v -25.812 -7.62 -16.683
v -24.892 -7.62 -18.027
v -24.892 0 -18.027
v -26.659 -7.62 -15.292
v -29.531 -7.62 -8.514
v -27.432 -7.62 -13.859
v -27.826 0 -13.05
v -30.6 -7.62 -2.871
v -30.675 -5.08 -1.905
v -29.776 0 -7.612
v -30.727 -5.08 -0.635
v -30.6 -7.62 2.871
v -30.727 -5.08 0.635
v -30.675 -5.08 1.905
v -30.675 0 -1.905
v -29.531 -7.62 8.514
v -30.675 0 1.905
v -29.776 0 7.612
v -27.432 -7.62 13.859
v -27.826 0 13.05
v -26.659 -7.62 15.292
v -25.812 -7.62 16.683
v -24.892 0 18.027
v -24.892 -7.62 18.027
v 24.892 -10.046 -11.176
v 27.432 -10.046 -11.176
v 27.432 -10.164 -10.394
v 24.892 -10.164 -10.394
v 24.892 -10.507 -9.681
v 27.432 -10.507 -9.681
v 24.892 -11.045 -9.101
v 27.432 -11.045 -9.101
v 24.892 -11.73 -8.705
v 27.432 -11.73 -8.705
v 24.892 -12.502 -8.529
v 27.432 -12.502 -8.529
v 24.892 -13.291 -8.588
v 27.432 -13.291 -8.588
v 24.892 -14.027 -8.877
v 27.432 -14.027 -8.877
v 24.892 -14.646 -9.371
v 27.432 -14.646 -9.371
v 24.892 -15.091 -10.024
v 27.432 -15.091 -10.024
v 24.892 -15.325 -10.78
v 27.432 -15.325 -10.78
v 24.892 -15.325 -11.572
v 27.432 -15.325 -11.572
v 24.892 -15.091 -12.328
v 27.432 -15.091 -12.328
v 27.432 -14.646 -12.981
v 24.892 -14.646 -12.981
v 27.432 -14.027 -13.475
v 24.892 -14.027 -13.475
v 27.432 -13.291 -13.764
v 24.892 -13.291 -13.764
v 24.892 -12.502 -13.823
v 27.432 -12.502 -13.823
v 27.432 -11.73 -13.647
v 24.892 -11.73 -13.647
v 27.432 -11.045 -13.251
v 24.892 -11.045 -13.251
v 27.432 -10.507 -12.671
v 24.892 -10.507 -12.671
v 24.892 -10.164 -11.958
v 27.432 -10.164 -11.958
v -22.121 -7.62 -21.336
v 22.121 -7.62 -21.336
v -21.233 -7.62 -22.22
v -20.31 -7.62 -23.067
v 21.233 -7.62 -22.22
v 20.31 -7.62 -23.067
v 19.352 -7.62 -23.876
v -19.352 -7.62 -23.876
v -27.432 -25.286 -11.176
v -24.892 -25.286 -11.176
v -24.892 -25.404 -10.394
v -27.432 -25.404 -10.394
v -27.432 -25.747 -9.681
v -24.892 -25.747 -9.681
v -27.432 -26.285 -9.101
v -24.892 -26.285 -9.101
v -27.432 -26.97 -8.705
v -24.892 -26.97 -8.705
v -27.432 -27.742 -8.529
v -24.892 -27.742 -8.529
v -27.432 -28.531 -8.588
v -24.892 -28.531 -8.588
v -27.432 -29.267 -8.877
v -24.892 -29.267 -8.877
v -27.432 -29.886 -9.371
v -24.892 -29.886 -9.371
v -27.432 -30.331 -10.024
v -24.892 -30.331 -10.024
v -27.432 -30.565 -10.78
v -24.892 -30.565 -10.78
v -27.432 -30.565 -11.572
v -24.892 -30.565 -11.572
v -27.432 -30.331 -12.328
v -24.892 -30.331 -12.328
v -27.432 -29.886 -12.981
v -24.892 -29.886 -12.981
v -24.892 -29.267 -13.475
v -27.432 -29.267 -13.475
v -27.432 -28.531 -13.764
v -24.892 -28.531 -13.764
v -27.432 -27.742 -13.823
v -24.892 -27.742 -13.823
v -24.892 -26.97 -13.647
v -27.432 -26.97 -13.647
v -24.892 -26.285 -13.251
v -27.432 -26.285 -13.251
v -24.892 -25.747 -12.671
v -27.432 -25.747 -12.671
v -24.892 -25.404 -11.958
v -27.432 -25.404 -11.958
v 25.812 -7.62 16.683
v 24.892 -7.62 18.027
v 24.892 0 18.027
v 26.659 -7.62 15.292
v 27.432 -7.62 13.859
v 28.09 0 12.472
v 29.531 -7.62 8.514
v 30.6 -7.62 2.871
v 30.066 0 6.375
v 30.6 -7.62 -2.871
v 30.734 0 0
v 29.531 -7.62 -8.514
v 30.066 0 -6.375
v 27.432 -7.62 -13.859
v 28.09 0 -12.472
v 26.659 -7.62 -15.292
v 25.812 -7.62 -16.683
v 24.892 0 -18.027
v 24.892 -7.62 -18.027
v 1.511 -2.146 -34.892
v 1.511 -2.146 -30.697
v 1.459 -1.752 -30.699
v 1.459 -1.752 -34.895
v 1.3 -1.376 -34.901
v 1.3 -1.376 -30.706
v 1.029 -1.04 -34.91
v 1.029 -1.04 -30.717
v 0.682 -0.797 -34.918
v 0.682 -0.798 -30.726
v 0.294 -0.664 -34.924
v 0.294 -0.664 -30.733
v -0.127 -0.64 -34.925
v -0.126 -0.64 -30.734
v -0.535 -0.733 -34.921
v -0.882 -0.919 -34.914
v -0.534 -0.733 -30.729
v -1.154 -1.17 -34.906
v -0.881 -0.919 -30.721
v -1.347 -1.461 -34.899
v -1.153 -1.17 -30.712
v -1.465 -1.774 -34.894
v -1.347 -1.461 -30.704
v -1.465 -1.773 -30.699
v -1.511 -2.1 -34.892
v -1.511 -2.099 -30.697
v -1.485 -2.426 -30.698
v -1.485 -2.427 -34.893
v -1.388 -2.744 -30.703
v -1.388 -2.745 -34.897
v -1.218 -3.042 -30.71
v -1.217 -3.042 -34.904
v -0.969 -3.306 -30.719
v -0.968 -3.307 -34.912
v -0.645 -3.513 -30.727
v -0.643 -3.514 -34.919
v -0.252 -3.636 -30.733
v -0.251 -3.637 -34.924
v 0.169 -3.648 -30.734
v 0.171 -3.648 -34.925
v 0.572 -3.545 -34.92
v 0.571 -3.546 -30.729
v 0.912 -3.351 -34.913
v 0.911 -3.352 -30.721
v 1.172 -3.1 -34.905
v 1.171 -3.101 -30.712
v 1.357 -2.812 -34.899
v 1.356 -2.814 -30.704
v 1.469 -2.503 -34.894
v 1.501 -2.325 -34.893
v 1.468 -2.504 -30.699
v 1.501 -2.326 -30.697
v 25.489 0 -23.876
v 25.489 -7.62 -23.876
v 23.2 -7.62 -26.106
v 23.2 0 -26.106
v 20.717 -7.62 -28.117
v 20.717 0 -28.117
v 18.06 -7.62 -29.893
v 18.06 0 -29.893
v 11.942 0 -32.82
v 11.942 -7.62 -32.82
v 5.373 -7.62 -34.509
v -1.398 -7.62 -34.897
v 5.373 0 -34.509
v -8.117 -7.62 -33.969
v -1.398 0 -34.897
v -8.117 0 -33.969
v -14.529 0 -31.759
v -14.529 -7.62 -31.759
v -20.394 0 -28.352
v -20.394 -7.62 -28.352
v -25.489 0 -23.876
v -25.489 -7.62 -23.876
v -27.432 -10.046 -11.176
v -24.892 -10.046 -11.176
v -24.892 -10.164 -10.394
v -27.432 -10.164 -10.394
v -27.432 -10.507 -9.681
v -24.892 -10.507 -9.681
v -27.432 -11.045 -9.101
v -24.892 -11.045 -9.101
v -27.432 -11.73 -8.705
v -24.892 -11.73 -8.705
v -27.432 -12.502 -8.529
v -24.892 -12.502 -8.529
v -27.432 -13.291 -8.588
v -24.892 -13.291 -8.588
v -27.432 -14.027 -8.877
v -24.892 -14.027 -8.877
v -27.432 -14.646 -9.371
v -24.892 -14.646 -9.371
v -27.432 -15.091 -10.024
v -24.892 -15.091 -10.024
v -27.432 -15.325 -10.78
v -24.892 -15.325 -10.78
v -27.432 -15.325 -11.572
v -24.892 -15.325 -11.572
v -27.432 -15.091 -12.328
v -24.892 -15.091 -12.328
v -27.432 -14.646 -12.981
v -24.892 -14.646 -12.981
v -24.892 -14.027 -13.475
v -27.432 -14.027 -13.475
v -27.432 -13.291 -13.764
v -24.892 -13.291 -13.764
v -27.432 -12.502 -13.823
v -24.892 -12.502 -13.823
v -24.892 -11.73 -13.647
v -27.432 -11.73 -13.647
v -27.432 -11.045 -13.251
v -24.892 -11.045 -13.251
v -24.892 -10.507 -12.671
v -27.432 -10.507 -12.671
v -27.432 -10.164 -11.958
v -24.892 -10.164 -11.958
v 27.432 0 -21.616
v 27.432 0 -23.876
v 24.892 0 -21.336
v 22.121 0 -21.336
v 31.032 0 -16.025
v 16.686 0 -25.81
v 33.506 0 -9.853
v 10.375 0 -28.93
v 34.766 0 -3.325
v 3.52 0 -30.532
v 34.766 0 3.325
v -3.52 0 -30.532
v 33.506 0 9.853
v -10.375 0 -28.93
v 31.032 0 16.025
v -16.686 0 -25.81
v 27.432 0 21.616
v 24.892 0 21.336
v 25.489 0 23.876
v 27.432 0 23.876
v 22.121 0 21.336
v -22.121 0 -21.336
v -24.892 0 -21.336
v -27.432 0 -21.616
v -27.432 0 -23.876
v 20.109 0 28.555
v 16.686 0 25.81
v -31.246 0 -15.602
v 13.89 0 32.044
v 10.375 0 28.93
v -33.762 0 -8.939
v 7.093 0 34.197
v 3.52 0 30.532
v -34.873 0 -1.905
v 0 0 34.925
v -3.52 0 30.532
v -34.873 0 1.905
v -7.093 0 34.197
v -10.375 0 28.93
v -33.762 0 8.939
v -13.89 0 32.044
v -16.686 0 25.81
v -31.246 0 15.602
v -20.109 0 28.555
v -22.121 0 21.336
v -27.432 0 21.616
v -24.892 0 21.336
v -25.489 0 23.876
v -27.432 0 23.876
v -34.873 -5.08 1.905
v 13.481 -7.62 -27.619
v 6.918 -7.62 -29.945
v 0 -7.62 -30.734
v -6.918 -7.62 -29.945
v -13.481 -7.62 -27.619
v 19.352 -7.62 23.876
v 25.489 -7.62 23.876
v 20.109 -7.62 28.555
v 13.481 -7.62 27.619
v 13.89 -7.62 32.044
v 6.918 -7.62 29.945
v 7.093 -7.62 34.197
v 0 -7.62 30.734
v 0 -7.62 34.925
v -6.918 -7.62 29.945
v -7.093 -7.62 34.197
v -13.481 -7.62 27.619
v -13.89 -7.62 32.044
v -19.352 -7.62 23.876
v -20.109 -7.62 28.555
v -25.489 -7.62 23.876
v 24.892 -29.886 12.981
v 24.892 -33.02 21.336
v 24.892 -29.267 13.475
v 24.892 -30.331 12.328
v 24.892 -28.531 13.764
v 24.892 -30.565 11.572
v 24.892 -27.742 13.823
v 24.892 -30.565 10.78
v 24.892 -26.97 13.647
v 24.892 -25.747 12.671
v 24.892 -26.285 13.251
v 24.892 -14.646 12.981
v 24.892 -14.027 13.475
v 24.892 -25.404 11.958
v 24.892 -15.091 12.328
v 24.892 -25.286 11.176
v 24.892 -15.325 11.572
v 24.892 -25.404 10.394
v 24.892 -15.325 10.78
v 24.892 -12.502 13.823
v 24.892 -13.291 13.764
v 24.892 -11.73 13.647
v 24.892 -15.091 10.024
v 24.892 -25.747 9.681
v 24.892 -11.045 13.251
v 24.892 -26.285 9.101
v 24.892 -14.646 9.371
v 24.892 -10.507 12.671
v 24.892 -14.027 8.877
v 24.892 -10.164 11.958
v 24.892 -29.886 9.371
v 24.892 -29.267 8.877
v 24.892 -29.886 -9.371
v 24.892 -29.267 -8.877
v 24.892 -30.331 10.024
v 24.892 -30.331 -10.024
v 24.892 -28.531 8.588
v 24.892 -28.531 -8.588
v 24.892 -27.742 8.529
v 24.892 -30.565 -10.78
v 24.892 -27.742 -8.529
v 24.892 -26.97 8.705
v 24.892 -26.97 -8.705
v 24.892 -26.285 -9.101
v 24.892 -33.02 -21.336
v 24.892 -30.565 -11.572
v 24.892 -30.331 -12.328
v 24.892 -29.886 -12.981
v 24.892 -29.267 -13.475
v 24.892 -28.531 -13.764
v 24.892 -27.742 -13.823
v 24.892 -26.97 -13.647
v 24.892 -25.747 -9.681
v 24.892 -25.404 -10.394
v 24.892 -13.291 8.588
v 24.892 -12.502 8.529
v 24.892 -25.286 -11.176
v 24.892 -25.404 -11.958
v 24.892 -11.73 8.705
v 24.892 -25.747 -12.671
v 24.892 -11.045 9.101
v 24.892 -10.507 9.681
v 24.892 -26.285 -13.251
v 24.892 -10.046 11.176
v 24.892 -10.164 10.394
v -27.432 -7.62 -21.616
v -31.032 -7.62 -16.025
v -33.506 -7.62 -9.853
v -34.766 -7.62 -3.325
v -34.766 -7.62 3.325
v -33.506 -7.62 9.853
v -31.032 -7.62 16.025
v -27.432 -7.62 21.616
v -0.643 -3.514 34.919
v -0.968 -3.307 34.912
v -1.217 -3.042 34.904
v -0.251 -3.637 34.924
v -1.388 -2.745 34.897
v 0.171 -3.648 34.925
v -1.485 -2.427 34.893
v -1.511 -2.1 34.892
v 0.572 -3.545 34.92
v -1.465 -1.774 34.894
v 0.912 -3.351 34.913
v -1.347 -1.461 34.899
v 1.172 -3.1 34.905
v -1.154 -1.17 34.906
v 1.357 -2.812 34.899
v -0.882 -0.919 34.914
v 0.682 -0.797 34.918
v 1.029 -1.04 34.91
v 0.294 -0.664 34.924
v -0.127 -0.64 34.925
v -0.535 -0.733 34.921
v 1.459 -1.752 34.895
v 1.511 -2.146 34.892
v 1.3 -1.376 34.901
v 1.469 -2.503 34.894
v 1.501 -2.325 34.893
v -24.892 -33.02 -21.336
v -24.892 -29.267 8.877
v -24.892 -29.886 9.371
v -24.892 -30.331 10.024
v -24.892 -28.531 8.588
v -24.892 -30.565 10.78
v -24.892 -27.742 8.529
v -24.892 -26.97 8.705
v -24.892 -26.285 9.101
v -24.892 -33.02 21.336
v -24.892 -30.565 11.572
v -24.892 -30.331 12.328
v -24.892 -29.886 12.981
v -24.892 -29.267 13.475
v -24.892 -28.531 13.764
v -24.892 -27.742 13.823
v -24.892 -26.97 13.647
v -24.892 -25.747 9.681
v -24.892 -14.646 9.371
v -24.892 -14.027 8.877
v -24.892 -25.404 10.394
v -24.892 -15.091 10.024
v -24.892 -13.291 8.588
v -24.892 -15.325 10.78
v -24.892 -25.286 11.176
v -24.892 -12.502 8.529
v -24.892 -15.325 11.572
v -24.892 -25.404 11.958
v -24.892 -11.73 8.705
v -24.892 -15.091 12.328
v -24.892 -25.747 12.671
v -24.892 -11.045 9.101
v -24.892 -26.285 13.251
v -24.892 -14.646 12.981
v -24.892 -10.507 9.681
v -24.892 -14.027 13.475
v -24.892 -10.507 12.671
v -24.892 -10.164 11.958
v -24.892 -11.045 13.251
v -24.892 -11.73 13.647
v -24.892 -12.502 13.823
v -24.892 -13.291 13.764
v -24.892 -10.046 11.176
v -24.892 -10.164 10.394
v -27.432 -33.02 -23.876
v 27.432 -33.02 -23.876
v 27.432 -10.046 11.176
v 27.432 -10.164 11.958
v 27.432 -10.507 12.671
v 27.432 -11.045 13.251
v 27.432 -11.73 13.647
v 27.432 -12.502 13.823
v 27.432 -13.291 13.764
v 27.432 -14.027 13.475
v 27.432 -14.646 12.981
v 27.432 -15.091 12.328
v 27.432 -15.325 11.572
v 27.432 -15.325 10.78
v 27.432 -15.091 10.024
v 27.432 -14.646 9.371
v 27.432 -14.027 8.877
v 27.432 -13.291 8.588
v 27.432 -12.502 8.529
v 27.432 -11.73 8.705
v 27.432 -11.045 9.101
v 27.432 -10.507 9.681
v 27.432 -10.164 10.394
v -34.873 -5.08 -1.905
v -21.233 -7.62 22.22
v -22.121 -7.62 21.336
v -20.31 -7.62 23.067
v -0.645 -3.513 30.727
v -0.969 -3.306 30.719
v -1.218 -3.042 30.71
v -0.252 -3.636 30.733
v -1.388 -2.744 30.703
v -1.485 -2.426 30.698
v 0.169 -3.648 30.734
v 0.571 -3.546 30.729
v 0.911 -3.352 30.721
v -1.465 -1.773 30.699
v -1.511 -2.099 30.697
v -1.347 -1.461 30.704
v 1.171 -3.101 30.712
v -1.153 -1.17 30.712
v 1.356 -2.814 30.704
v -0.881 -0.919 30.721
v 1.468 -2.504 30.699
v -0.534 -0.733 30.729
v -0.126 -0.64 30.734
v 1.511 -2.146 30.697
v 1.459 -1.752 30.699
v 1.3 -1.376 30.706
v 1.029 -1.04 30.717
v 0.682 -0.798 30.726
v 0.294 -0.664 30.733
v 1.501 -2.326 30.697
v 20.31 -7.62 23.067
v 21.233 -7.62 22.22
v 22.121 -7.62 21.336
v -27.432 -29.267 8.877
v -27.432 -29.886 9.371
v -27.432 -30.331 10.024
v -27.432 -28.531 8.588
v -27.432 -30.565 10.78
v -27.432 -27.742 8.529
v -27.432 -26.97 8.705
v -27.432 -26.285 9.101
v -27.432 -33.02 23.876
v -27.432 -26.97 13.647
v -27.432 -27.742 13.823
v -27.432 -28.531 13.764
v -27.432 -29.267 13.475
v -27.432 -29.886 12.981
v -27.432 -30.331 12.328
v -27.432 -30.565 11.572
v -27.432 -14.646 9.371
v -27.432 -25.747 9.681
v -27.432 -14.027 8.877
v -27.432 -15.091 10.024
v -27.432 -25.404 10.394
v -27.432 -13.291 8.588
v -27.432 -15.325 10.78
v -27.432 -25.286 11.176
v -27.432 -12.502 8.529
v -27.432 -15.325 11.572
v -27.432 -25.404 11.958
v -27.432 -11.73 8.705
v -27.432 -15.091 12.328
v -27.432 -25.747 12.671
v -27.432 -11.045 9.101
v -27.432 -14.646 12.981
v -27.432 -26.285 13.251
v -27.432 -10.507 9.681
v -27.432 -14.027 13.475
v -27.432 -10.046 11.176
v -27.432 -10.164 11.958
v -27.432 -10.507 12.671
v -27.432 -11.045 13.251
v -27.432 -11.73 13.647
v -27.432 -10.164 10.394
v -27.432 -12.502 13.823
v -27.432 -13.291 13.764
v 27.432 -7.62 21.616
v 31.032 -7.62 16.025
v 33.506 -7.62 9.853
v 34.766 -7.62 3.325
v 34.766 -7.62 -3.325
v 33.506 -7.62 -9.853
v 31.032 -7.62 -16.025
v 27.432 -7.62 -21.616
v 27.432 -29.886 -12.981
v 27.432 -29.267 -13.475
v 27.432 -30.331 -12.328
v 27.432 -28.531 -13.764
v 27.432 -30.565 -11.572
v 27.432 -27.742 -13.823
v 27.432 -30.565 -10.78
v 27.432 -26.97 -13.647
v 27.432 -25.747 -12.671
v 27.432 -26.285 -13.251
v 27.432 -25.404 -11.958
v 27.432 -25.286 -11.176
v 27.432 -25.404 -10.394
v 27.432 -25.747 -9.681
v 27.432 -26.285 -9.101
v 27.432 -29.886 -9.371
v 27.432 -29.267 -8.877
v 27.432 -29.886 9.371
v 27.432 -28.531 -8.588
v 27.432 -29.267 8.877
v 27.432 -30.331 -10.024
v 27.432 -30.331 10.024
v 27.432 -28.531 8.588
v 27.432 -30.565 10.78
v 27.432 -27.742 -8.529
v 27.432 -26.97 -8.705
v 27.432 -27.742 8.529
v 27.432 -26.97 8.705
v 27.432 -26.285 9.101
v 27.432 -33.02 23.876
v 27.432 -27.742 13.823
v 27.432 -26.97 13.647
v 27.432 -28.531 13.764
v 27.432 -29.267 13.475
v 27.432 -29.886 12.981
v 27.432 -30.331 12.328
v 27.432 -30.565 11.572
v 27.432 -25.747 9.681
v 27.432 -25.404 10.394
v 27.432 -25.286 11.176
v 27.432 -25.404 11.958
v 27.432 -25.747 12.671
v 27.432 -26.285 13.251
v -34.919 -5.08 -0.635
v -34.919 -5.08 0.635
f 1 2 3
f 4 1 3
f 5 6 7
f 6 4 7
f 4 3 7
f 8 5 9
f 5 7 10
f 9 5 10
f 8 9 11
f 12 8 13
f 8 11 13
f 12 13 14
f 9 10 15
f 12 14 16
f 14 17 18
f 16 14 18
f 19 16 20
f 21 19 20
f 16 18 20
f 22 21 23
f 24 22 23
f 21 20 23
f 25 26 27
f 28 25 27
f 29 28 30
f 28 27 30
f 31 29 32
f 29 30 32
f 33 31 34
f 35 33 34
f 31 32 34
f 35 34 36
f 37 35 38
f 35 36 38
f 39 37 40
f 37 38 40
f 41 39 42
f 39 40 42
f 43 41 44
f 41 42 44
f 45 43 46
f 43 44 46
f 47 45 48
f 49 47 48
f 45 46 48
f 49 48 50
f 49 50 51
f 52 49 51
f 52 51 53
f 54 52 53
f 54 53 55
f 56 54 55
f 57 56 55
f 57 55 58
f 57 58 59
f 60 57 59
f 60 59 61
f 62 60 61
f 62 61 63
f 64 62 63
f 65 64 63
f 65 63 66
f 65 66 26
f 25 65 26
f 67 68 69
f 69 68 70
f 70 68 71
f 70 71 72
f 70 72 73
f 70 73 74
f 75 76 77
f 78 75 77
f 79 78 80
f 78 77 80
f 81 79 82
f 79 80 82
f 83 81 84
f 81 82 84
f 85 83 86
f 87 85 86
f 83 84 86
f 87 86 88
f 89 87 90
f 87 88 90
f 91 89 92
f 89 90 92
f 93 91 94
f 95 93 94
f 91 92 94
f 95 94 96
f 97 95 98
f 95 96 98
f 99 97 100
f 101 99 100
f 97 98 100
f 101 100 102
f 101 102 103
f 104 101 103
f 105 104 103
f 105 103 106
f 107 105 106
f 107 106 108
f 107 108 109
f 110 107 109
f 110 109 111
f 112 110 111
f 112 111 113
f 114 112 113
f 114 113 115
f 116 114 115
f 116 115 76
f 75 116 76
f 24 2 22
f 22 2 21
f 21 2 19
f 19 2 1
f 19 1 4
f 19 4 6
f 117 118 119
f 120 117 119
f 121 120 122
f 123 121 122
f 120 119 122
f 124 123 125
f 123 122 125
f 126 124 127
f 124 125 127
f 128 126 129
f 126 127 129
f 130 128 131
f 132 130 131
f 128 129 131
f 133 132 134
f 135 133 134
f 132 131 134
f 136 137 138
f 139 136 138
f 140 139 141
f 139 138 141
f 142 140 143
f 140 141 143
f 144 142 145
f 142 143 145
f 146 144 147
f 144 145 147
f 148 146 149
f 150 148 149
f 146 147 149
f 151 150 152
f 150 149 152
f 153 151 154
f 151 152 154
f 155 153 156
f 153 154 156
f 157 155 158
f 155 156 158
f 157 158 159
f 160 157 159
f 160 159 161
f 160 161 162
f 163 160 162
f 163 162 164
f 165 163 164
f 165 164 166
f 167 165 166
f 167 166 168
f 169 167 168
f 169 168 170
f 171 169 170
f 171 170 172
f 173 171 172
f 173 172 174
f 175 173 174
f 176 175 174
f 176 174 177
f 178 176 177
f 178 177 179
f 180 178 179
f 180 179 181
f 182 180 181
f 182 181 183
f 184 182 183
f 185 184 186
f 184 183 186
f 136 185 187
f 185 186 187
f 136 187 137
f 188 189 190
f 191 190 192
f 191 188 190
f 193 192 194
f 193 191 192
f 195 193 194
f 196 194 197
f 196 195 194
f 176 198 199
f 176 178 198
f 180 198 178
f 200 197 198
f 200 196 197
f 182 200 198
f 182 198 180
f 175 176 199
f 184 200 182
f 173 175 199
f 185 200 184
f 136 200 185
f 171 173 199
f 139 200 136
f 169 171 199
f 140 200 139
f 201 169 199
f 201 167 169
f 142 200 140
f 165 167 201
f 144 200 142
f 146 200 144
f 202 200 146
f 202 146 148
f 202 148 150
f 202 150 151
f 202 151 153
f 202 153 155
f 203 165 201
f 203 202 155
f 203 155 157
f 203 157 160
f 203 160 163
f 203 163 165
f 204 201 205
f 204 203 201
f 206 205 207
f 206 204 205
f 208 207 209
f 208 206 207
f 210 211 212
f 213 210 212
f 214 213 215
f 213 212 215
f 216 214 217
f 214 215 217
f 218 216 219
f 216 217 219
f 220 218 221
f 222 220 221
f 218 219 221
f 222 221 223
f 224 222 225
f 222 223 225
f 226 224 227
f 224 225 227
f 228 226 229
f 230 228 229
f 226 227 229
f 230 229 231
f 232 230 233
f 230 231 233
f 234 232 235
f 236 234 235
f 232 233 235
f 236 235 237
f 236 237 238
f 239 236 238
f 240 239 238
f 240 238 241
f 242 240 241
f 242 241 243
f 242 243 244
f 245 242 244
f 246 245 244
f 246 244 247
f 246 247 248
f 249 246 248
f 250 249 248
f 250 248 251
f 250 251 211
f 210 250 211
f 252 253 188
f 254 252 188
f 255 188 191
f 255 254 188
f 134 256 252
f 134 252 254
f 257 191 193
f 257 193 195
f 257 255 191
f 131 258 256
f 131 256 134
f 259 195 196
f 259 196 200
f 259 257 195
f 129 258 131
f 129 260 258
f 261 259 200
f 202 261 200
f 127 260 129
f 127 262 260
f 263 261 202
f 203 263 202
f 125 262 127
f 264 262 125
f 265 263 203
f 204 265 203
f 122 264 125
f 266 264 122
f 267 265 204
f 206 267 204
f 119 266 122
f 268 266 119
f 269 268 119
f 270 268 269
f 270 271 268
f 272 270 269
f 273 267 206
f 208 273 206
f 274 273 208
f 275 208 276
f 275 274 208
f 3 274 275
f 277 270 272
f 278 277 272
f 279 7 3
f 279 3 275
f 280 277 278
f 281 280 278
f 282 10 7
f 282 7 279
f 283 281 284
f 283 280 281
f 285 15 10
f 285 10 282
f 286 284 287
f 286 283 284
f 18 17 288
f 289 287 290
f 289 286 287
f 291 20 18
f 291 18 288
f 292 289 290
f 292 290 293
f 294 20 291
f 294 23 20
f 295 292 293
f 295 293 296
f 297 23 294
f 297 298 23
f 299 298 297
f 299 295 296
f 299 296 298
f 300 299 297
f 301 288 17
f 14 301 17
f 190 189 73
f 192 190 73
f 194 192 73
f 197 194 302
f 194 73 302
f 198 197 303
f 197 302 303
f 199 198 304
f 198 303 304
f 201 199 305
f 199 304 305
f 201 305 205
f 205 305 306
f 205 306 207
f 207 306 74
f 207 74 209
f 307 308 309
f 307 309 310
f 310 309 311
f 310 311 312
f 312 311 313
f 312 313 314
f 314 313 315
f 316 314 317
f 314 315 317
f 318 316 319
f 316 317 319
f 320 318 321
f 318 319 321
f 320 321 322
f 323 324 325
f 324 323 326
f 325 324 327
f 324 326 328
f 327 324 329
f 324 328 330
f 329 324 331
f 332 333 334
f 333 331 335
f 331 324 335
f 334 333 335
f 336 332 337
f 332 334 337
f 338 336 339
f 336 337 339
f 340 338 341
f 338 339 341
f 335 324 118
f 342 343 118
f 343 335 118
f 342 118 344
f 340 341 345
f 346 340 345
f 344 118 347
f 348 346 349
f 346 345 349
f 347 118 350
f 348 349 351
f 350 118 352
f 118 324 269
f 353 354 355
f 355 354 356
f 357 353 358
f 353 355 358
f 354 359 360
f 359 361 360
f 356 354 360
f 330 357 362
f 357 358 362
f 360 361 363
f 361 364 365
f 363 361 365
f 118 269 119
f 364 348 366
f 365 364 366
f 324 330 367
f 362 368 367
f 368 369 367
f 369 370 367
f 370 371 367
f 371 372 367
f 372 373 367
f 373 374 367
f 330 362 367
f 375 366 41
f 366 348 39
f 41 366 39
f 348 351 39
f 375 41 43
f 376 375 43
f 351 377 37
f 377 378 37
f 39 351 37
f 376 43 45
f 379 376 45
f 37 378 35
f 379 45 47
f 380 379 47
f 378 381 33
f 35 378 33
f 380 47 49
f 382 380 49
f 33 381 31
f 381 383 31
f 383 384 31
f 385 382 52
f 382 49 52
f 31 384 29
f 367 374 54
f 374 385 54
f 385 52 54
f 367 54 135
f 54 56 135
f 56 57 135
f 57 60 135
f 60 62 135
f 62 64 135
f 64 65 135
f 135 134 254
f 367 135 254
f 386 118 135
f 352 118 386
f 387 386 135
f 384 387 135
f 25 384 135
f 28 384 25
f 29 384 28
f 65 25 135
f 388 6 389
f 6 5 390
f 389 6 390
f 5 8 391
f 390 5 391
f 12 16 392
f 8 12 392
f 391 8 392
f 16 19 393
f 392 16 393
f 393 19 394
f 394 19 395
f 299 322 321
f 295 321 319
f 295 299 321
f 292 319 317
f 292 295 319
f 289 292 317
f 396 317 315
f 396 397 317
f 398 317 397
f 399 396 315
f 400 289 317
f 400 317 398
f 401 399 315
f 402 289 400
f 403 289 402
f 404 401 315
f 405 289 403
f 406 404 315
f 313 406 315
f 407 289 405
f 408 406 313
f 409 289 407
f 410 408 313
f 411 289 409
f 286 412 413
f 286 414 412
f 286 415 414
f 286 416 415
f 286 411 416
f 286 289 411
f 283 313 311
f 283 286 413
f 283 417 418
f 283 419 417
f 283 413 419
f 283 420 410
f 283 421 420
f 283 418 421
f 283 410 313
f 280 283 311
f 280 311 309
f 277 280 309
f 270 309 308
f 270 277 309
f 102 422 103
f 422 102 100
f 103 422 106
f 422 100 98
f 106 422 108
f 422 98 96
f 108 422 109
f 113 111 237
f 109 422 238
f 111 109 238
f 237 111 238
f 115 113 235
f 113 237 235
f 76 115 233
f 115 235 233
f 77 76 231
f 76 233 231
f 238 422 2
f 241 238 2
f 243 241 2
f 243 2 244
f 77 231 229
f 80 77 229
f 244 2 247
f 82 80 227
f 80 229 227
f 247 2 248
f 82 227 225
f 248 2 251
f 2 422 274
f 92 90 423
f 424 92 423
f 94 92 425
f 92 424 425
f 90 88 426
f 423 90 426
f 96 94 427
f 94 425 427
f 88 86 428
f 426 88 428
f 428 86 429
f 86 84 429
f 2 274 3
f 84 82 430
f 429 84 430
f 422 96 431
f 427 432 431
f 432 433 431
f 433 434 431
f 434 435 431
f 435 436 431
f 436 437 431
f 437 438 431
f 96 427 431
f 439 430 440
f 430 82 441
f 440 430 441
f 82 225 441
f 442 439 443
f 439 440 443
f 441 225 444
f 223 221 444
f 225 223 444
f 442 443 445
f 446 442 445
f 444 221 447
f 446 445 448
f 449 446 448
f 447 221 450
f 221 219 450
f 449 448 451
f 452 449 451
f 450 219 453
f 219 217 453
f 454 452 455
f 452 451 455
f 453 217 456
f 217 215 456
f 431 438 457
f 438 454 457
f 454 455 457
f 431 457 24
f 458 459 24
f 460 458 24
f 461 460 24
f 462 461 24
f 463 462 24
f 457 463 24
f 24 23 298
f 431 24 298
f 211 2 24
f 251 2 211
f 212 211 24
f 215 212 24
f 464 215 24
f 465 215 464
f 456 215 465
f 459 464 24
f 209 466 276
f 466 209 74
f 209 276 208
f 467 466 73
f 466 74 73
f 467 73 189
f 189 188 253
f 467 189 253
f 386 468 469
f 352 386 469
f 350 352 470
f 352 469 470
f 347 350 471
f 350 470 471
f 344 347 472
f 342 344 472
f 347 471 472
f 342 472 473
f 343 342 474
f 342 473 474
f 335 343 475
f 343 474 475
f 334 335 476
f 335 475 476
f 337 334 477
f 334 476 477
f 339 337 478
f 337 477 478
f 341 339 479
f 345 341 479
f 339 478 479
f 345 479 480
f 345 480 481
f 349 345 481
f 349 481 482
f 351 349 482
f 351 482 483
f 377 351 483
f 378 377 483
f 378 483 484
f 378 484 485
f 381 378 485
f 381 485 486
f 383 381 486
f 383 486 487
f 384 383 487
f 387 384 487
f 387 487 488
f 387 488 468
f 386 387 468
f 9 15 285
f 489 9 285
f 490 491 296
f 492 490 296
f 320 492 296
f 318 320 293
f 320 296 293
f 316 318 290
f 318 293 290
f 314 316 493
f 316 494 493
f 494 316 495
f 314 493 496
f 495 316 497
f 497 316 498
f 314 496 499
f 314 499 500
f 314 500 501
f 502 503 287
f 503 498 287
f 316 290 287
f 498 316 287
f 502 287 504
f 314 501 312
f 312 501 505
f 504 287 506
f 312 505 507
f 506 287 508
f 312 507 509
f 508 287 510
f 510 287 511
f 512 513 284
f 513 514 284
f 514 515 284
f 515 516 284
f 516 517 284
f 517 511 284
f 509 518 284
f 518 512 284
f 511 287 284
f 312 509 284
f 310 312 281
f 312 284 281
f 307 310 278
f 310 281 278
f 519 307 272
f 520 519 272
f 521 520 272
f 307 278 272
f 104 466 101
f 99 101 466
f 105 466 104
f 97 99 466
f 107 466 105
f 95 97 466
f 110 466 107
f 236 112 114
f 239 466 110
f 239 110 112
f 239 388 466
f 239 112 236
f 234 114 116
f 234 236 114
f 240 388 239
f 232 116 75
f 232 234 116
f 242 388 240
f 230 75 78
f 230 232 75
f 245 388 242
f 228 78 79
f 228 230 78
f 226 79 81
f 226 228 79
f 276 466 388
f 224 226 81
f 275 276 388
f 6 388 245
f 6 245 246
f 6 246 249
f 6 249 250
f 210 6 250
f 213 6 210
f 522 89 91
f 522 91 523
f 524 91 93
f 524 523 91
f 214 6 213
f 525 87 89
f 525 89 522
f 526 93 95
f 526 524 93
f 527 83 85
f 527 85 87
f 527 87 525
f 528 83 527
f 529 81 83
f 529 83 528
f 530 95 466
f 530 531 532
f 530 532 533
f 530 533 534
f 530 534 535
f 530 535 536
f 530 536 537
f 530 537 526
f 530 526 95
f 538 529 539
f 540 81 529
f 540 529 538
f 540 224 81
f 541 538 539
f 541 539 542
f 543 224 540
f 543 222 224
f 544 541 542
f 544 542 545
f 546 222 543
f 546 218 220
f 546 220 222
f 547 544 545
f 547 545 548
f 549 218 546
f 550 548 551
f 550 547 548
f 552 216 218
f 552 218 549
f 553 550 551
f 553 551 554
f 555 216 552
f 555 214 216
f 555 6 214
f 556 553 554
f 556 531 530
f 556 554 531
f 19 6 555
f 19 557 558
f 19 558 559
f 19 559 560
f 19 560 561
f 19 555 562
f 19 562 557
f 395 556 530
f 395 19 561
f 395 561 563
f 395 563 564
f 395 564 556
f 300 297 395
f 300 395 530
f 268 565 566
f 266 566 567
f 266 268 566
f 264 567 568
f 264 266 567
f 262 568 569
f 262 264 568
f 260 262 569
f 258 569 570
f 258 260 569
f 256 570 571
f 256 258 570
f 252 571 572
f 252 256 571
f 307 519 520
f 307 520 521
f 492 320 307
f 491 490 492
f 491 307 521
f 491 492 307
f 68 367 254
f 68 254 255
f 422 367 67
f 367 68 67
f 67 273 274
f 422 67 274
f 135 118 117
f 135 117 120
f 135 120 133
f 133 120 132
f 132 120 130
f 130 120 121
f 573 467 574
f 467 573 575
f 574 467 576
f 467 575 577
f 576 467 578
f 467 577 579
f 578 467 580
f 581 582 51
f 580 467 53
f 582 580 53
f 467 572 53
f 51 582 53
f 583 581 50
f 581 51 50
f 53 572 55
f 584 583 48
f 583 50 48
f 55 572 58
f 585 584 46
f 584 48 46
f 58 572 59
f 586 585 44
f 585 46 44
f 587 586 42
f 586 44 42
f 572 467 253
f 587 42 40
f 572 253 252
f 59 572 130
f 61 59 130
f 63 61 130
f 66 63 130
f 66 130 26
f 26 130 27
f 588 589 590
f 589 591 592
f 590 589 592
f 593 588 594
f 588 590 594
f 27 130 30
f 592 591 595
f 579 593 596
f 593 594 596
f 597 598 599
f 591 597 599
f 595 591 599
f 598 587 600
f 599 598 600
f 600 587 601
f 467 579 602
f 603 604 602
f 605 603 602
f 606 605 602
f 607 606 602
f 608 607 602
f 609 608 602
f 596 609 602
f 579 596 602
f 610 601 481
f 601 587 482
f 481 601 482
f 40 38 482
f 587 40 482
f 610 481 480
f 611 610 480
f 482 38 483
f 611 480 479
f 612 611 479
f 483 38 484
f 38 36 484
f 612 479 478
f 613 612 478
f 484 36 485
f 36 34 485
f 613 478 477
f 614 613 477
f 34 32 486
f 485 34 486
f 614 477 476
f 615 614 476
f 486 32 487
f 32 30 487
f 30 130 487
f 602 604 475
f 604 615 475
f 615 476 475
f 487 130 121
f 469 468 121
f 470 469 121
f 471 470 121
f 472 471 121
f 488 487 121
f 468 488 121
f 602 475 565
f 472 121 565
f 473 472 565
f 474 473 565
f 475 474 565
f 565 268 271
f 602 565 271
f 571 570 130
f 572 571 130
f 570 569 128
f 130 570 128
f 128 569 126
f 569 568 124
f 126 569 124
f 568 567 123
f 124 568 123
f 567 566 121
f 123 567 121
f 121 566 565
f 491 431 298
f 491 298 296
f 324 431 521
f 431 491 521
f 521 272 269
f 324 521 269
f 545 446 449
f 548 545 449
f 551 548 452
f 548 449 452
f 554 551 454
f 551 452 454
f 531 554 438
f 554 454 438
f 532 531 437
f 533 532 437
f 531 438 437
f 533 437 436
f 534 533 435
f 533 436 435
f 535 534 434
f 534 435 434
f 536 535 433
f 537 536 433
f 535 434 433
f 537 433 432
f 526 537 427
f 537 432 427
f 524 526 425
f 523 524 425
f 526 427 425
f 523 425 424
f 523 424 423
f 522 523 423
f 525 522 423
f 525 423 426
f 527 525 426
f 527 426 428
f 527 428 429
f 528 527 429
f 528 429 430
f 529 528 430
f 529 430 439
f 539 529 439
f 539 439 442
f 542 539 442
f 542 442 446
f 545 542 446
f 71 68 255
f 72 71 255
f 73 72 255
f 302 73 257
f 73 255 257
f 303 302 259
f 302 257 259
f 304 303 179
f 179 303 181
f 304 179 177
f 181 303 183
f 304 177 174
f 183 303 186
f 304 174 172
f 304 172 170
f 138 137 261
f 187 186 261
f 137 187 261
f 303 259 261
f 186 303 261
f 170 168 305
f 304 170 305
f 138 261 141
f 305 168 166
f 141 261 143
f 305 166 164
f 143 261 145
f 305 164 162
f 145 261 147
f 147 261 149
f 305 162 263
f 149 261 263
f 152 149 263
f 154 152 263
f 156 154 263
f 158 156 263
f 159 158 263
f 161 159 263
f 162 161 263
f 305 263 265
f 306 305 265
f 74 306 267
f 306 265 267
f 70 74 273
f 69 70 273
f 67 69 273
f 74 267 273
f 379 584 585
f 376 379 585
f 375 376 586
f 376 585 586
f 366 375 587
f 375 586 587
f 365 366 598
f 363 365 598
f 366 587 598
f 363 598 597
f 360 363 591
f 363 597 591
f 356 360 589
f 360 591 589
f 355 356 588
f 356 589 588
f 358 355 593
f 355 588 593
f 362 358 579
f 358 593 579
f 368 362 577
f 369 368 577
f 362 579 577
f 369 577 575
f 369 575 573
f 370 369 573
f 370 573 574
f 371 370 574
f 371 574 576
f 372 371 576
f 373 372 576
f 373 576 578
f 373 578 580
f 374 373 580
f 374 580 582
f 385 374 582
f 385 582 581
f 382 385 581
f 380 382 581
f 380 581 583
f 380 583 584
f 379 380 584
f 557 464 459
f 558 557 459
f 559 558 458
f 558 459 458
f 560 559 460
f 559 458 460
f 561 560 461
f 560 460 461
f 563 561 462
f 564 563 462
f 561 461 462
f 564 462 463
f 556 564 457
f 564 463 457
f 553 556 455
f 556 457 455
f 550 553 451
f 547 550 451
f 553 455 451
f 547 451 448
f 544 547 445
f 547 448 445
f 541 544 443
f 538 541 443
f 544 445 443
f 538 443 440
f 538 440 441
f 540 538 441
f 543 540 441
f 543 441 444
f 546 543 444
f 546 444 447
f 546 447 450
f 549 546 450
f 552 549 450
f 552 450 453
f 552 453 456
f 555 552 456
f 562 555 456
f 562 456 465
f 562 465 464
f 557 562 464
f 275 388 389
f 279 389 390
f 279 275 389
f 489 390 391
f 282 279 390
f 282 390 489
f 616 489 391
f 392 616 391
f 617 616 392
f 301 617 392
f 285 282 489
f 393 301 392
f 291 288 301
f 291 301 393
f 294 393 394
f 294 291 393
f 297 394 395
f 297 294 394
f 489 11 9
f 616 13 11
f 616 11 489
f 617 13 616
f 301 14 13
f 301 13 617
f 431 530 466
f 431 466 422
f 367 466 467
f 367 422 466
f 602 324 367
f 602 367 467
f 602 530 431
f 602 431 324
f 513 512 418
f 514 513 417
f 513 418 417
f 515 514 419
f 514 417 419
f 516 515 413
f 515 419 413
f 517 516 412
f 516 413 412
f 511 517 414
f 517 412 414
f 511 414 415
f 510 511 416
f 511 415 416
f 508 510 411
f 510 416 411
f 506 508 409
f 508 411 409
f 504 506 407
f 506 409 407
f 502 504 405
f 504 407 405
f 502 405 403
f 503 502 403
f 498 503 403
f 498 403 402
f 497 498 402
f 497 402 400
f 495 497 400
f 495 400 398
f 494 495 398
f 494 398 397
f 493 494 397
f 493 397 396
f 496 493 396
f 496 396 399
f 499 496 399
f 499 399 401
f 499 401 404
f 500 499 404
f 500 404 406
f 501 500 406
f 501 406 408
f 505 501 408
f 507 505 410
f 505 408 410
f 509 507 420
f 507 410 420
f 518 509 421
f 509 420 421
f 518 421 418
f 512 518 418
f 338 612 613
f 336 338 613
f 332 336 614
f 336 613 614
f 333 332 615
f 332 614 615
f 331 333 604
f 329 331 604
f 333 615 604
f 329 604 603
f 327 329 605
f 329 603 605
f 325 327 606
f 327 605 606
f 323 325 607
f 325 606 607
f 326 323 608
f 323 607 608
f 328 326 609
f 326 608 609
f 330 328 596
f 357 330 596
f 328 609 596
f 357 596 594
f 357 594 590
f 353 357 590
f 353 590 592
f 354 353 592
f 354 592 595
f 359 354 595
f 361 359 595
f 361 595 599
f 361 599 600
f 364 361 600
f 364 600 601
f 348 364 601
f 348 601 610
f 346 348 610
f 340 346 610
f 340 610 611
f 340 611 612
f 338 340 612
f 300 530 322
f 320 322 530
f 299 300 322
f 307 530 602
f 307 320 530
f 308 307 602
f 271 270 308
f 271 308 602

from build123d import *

# Parameters (mm, degrees)
F0_W      = 54.864
F0_H      = 47.752
F1_DEPTH  = 33.02
F2_W      = 24.892
F2_H      = 21.336
F3_DEPTH  = 33.02
F4_R      = 34.925
F4_R_2    = 30.734
F5_DEPTH  = 7.62
F6_R      = 2.6543
F7_DEPTH  = 76.2
F9_DEPTH  = 7.62
F11_DEPTH = 25.4
F12_R     = 30.734
F13_DEPTH = 7.62
F15_DEPTH = 5.08
F17_R     = 1.5113
F18_DEPTH = 127


with BuildPart() as f1:
    # F0 (on Front) → F1 (new body)
    with BuildSketch(Plane.XZ):
        Rectangle(F0_W, F0_H)
    extrude(amount=F1_DEPTH)

    # F2 (on face) → F3 (cut)
    with BuildSketch(Plane.XZ.offset(33.02)):
        with Locations((-12.446, 10.668)):
            Rectangle(F2_W, F2_H)
        with Locations((12.446, -10.668)):
            Rectangle(F2_W, F2_H)
        with Locations((-12.446, -10.668)):
            Rectangle(F2_W, F2_H)
        with Locations((12.446, 10.668)):
            Rectangle(F2_W, F2_H)
    extrude(amount=-F3_DEPTH, mode=Mode.SUBTRACT)

    # F4 (on face) → F5 (join)
    with BuildSketch(Plane(origin=(0, 0, 0), x_dir=(-1, 0, 0), z_dir=(0, 1, 0))):
        Circle(F4_R)
        Circle(F4_R_2, mode=Mode.SUBTRACT)
    extrude(amount=-F5_DEPTH)

    # F6 (on face) → F7 (cut)
    with BuildSketch(Plane.YZ.offset(27.432)):
        with Locations((-27.94, 11.176)):
            Circle(F6_R)
        with Locations((-27.94, -11.176)):
            Circle(F6_R)
        with Locations((-12.7, 11.176)):
            Circle(F6_R)
        with Locations((-12.7, -11.176)):
            Circle(F6_R)
    extrude(amount=-F7_DEPTH, mode=Mode.SUBTRACT)

    # F8 (on face) → F9 (join)
    with BuildSketch(Plane(origin=(0, 0, 0), x_dir=(-1, 0, 0), z_dir=(0, 1, 0))):
        Polygon((-15.239977, 28.93018), (-21.844286, 22.671998), (22.174528, 22.671998), (17.10213, 27.676882), (0, 33.06745), align=None)
        Polygon((-26.720829, -17.021414), (-26.720829, 16.84154), (-31.688731, 8.959086), (-33.177566, -3.639529), align=None)
        Polygon((-18.059891, -29.893076), (0, -33.054188), (13.156982, -30.942233), (22.121344, -22.471936), (-24.892, -22.471936), align=None)
        Polygon((26.667995, 16.763607), (26.667995, -17.988142), (32.70267, -7.179345), (32.70267, 5.721464), align=None)
    extrude(amount=-F9_DEPTH)

    # F10 (on face) → F11 (cut)
    with BuildSketch(Plane(origin=(0, 0, 0), x_dir=(-1, 0, 0), z_dir=(0, 1, 0))):
        Polygon((24.892, 21.336), (-22.121344, 21.336), (-24.892, 21.336), (-24.892, -18.026844), (-24.892, -21.336), (24.892, -21.336), align=None)
    extrude(amount=-F11_DEPTH, mode=Mode.SUBTRACT)

    # F12 (on face) → F13 (cut)
    with BuildSketch(Plane(origin=(0, 0, 0), x_dir=(-1, 0, 0), z_dir=(0, 1, 0))):
        Circle(F12_R)
    extrude(amount=-F13_DEPTH, mode=Mode.SUBTRACT)

    # F14 (on face) → F15 (cut)
    with BuildSketch(Plane(origin=(0, 0, 0), x_dir=(-1, 0, 0), z_dir=(0, 1, 0))):
        Polygon((34.873007, 1.905), (30.674904, 1.905), (30.031135, 1.905), (29.740494, -1.788886), (30.5029, -1.905), (30.674904, -1.905), (34.873007, -1.905), (38.508706, 0.957784), align=None)
    extrude(amount=-F15_DEPTH, mode=Mode.SUBTRACT)

    # F17 (on offset) → F18 (cut)
    with BuildSketch(Plane.XY.offset(76.2)):
        with Locations((0, -2.1463)):
            Circle(F17_R)
    extrude(amount=-F18_DEPTH, mode=Mode.SUBTRACT)


solid = f1.part
